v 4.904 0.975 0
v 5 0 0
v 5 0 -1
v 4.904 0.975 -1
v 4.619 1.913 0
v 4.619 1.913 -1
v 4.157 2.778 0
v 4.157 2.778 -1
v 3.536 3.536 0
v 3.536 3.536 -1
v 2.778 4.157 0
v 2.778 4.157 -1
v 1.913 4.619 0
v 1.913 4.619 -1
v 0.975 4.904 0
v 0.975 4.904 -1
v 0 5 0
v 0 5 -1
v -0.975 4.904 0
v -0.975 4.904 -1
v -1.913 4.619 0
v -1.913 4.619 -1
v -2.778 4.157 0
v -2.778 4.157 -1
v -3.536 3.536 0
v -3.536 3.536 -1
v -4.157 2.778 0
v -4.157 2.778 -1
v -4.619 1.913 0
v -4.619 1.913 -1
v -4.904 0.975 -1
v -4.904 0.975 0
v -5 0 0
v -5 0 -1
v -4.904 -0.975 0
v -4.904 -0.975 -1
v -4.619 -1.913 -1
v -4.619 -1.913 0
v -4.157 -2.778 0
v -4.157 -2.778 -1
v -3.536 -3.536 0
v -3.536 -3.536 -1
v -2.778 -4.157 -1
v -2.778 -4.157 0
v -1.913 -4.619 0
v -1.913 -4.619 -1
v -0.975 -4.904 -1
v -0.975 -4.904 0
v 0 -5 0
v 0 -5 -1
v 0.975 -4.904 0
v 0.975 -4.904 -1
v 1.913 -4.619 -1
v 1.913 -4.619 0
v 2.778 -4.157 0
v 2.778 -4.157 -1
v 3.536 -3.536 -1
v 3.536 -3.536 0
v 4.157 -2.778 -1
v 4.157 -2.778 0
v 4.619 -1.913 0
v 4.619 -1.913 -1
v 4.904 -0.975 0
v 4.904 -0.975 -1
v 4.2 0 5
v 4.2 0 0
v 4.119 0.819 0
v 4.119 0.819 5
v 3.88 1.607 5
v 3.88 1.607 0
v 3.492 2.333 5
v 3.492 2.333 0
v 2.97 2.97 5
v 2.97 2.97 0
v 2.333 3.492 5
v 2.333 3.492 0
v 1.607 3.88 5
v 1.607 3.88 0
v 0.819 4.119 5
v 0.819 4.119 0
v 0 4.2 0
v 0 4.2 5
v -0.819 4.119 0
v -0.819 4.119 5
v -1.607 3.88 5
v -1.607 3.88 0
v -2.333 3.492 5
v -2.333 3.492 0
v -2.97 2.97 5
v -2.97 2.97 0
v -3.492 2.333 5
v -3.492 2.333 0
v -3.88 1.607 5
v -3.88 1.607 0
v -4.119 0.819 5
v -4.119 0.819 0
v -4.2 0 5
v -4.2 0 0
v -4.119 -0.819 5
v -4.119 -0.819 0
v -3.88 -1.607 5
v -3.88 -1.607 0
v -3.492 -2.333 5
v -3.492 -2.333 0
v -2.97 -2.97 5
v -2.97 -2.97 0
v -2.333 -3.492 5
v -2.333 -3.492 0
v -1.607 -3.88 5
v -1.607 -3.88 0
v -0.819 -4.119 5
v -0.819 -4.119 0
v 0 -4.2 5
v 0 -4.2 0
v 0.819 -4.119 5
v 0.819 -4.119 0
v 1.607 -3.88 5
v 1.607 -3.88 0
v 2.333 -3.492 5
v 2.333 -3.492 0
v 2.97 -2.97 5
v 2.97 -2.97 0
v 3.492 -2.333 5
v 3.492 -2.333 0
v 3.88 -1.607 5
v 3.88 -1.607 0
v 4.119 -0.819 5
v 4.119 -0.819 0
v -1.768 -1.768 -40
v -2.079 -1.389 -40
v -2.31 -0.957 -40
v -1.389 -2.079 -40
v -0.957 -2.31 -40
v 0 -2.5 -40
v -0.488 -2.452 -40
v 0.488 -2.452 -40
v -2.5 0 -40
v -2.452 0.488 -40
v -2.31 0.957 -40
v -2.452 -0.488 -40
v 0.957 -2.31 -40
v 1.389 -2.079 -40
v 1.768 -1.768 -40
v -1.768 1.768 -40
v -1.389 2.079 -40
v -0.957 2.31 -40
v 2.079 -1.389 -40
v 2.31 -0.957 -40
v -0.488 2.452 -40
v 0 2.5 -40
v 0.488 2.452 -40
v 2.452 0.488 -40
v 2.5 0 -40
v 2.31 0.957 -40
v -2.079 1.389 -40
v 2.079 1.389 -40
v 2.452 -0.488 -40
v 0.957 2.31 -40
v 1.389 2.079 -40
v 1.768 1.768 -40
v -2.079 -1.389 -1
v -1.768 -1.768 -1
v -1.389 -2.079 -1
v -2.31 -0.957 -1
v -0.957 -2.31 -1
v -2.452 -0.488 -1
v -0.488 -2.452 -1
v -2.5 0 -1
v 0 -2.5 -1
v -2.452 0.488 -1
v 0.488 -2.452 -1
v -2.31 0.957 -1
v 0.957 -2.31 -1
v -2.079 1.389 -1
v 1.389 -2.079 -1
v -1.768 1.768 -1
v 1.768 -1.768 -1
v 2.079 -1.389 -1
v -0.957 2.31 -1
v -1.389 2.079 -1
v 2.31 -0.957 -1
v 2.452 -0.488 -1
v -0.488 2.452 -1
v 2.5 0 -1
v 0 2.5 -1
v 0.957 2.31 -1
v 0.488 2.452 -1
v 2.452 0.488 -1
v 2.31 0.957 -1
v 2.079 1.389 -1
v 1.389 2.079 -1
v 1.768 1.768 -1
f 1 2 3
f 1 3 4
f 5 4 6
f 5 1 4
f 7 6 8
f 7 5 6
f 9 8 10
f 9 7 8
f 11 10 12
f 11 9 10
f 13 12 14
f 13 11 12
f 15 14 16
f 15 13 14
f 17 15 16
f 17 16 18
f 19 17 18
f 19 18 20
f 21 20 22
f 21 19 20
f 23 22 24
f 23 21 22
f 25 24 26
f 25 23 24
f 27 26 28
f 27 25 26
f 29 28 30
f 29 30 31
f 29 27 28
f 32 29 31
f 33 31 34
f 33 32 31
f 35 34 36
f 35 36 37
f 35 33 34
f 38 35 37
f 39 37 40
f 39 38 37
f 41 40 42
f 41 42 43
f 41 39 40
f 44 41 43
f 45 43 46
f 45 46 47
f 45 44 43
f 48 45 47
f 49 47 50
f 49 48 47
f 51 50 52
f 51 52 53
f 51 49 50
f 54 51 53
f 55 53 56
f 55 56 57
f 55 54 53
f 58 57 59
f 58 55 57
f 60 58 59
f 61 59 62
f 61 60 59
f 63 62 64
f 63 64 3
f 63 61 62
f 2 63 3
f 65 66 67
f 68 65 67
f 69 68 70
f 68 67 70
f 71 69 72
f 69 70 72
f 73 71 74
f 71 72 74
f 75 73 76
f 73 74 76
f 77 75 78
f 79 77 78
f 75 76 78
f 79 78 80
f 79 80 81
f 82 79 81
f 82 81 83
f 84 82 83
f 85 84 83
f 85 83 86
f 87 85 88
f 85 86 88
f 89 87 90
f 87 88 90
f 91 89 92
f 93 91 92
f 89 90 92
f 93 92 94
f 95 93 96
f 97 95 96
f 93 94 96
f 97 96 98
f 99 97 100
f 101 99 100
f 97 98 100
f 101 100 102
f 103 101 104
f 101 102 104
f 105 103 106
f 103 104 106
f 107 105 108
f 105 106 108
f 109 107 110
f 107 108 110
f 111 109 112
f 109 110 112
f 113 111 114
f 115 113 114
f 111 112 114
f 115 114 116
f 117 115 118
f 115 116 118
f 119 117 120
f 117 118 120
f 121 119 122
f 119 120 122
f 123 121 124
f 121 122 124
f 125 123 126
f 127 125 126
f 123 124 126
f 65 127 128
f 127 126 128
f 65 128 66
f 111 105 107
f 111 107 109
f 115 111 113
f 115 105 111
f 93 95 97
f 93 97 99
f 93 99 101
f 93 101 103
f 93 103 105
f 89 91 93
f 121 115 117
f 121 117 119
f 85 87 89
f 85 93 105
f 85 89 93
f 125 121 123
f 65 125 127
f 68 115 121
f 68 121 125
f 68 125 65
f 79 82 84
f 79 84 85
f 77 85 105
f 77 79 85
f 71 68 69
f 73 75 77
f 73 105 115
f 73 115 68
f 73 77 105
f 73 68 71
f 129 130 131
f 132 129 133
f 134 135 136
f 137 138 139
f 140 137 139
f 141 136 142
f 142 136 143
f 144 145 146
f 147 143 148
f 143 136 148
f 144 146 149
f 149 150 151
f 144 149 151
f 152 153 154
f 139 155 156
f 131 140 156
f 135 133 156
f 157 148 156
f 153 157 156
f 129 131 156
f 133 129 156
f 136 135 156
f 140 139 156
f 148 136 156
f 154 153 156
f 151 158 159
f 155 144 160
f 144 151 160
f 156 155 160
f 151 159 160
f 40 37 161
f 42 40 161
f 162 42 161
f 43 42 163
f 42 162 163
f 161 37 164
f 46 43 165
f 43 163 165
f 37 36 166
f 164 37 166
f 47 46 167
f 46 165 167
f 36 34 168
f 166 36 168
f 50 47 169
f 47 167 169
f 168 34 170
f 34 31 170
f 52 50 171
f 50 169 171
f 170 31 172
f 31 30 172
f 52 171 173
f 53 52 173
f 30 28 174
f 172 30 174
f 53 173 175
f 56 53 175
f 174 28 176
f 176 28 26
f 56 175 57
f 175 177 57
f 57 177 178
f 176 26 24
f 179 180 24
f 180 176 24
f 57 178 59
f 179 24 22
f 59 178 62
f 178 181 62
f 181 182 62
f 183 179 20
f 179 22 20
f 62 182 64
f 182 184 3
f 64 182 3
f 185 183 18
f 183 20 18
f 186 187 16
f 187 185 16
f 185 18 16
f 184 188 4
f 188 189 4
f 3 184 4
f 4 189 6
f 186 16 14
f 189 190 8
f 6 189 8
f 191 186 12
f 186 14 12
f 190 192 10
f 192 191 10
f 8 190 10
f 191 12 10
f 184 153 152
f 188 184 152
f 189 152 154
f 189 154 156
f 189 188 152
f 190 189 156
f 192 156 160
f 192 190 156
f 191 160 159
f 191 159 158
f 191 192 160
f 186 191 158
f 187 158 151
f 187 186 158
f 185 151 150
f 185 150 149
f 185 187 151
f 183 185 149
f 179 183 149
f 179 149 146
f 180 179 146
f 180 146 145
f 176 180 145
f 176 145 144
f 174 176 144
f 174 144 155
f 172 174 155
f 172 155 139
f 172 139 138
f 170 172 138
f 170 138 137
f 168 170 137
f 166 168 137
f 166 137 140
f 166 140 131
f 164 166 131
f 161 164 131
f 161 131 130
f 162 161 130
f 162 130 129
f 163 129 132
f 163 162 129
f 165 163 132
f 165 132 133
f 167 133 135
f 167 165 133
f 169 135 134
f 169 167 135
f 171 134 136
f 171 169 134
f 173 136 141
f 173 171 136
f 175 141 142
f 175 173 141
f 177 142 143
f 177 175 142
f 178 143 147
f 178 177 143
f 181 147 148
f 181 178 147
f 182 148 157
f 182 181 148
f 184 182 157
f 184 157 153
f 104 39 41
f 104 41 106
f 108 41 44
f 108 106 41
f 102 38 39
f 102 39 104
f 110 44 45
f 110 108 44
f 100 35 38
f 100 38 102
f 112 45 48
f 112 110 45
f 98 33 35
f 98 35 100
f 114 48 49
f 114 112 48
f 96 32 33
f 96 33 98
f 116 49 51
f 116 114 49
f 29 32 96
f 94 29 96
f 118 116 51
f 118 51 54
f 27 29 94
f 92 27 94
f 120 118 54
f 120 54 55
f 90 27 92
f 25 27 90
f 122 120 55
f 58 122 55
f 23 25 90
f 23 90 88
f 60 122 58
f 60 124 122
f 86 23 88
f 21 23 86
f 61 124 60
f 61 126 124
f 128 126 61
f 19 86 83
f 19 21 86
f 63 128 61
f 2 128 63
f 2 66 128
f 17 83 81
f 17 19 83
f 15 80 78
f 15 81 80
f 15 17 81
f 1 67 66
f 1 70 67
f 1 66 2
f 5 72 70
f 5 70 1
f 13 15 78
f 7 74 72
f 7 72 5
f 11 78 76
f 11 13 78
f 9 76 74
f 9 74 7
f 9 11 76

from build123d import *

# Parameters (mm, degrees)
F0_R     = 2.5
F1_DEPTH = 40
F2_R     = 4.2
F3_DEPTH = 5
F4_R     = 5
F5_DEPTH = 1


with BuildPart() as f1:
    # F0 (on Top) → F1 (new body)
    with BuildSketch(Plane.XY):
        Circle(F0_R)
    extrude(amount=-F1_DEPTH)

    # F2 (on Top) → F3 (join)
    with BuildSketch(Plane.XY):
        Circle(F2_R)
    extrude(amount=F3_DEPTH)

    # F4 (on Top) → F5 (join)
    with BuildSketch(Plane.XY):
        Circle(F4_R)
    extrude(amount=-F5_DEPTH)


solid = f1.part
